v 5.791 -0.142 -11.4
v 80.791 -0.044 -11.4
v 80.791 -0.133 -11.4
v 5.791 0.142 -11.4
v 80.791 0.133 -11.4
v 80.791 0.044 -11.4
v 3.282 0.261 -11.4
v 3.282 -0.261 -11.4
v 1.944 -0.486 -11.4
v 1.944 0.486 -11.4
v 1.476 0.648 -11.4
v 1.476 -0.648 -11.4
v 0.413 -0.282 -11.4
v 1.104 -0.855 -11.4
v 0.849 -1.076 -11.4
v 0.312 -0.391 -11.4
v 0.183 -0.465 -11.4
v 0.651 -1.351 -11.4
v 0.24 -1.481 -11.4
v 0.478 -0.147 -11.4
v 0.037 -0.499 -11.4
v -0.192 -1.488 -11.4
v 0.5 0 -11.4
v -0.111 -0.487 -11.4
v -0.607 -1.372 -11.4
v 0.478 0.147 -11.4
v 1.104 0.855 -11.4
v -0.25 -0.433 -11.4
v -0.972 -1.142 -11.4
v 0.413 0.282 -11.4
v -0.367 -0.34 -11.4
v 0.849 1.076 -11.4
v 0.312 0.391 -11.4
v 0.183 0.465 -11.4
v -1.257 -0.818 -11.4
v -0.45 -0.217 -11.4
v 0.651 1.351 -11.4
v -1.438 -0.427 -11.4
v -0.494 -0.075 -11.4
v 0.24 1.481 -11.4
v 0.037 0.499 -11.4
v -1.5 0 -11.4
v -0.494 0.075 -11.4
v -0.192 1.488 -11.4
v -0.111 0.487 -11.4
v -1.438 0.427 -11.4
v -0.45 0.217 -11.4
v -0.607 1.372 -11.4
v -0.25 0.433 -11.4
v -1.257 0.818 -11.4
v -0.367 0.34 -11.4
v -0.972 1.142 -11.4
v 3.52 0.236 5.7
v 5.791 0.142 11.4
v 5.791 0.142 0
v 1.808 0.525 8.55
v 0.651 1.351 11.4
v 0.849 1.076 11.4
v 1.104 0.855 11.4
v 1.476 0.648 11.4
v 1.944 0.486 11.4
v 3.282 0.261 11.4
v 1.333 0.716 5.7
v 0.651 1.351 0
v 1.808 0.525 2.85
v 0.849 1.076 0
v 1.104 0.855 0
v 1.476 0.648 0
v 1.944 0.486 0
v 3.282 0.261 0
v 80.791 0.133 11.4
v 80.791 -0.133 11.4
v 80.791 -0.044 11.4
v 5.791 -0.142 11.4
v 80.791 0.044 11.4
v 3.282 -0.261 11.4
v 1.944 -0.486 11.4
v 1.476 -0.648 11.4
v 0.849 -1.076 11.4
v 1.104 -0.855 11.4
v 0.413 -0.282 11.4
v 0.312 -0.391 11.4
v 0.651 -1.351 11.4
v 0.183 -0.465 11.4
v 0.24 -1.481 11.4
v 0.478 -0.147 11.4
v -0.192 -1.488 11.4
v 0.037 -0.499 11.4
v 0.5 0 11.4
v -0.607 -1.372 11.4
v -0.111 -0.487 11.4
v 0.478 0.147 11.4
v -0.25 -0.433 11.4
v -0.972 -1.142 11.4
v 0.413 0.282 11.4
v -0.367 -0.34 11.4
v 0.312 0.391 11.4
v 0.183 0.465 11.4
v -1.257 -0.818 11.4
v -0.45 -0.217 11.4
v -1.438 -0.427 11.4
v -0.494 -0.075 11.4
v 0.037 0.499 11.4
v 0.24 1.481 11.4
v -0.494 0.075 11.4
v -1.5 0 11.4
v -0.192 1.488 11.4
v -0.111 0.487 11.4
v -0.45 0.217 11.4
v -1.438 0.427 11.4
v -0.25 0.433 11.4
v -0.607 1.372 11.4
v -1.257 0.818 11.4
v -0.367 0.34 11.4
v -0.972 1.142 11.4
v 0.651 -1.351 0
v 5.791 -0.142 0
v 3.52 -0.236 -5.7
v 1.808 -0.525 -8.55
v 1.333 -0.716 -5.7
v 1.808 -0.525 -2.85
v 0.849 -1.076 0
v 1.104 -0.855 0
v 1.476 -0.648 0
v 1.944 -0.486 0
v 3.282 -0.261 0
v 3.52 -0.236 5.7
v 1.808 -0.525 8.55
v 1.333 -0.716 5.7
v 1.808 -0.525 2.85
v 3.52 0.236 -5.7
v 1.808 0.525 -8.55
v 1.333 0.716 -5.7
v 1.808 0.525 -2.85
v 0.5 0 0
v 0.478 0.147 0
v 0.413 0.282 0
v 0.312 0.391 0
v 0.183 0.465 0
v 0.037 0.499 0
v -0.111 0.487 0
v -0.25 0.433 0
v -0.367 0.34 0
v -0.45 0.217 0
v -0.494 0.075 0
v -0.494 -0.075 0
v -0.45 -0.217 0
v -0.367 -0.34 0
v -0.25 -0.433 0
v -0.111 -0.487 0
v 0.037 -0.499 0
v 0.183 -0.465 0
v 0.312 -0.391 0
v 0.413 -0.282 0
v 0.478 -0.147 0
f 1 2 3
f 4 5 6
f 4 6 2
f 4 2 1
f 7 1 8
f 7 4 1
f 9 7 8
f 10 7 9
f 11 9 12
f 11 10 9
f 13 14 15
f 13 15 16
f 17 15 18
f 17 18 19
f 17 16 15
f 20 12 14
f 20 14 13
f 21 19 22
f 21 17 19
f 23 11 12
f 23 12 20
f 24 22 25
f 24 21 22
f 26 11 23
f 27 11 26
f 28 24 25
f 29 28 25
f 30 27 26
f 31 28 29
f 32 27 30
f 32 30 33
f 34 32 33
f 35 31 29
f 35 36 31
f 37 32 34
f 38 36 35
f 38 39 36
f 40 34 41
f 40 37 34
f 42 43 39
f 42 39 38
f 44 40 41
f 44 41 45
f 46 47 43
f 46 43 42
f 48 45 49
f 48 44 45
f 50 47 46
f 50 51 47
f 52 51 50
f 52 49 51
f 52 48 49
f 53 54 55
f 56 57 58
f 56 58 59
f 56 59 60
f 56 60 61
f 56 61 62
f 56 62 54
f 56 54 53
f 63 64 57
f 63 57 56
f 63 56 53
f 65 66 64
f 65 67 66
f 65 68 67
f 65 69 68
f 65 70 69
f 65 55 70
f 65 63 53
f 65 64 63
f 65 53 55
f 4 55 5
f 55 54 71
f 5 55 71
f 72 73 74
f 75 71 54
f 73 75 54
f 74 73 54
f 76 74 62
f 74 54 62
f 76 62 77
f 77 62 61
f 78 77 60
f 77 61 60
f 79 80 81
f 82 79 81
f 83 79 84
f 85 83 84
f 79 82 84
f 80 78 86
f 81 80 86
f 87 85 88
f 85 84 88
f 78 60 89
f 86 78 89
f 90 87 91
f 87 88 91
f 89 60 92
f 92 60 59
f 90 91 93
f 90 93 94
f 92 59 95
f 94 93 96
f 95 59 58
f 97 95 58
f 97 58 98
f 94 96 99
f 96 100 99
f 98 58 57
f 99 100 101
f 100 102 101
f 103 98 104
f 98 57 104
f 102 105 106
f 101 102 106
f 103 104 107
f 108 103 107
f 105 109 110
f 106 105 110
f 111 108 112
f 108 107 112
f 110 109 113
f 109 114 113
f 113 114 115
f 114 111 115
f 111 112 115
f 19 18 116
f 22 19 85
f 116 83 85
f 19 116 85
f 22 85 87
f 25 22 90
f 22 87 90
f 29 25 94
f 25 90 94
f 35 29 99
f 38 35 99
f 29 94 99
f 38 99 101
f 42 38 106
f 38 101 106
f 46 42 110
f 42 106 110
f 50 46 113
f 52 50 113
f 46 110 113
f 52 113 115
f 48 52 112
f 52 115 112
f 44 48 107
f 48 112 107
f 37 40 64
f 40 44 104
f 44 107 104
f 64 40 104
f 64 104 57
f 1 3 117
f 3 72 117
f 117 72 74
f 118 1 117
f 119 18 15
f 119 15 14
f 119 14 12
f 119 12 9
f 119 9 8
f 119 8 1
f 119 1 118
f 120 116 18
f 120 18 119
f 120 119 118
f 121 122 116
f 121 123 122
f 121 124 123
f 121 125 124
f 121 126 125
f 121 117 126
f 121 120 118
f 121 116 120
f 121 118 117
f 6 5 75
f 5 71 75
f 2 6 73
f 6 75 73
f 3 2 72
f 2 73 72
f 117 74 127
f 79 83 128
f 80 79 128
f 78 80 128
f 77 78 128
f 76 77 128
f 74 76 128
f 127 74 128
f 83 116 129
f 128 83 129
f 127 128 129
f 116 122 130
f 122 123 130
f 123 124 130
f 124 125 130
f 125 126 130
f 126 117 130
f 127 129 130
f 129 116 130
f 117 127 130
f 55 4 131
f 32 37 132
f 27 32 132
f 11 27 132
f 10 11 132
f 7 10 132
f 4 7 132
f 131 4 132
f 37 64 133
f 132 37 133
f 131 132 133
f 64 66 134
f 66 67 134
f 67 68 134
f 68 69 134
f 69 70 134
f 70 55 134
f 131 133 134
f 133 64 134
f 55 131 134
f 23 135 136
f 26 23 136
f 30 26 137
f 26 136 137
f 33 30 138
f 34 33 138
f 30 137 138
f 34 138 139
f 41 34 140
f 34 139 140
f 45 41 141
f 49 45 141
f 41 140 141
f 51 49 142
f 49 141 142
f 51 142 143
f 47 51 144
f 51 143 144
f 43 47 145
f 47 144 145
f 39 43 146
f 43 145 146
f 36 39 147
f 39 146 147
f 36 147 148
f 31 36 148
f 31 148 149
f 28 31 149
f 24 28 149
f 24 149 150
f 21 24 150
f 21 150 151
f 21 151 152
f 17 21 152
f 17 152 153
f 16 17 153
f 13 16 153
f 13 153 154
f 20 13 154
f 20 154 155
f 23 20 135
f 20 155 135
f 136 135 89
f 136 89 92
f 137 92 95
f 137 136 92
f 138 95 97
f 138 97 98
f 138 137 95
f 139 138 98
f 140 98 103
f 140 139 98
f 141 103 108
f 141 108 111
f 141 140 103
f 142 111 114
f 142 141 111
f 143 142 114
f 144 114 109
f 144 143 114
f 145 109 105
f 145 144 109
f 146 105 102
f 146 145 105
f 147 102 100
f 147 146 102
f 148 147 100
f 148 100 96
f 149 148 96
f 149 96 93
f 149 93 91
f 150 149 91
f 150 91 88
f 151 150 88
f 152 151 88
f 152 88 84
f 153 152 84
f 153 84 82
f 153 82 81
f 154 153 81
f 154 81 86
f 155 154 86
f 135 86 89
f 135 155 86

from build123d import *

# Parameters (mm, degrees)
BOSS_EXTRU_1_DEPTH      = 11.4
BOSS_EXTRU_1_DEPTH_BACK = 11.4
ESQUISSE2_R             = 0.5


with BuildPart() as part:
    # Esquisse2 → Boss.-Extru.1 (new, two sides: drawn at the far end of the back side and taken through both)
    with BuildSketch(Plane.XY.offset(-BOSS_EXTRU_1_DEPTH_BACK)):
        with BuildLine():
            Line((5.791060422, 0.142064292), (80.791060422, 0.133235508))
            ThreePointArc((80.791060422, 0.133235508), (80.791208073, 0), (80.791060422, -0.133235508))
            Line((80.791060422, -0.133235508), (5.791060422, -0.142064292))
            add(Edge.make_bspline(
                [(0.650938463, -1.351398948), (1.114517622, -0.510365175), (3.069897688, -0.268204079), (5.029284194, -0.087299538), (5.791060422, -0.142064292)],
                knots=[0, 0, 0, 0, 0.614720571, 1, 1, 1, 1], degree=3))
            ThreePointArc((0.650938463, -1.351398948), (-1.5, 0), (0.650938463, 1.351398948))
            add(Edge.make_bspline(
                [(0.650938463, 1.351398948), (1.114517622, 0.510365175), (3.069897688, 0.268204079), (5.029284194, 0.087299538), (5.791060422, 0.142064292)],
                knots=[0, 0, 0, 0, 0.614720571, 1, 1, 1, 1], degree=3))
        make_face()
        Circle(ESQUISSE2_R, mode=Mode.SUBTRACT)
    extrude(amount=BOSS_EXTRU_1_DEPTH + BOSS_EXTRU_1_DEPTH_BACK)


solid = part.part
